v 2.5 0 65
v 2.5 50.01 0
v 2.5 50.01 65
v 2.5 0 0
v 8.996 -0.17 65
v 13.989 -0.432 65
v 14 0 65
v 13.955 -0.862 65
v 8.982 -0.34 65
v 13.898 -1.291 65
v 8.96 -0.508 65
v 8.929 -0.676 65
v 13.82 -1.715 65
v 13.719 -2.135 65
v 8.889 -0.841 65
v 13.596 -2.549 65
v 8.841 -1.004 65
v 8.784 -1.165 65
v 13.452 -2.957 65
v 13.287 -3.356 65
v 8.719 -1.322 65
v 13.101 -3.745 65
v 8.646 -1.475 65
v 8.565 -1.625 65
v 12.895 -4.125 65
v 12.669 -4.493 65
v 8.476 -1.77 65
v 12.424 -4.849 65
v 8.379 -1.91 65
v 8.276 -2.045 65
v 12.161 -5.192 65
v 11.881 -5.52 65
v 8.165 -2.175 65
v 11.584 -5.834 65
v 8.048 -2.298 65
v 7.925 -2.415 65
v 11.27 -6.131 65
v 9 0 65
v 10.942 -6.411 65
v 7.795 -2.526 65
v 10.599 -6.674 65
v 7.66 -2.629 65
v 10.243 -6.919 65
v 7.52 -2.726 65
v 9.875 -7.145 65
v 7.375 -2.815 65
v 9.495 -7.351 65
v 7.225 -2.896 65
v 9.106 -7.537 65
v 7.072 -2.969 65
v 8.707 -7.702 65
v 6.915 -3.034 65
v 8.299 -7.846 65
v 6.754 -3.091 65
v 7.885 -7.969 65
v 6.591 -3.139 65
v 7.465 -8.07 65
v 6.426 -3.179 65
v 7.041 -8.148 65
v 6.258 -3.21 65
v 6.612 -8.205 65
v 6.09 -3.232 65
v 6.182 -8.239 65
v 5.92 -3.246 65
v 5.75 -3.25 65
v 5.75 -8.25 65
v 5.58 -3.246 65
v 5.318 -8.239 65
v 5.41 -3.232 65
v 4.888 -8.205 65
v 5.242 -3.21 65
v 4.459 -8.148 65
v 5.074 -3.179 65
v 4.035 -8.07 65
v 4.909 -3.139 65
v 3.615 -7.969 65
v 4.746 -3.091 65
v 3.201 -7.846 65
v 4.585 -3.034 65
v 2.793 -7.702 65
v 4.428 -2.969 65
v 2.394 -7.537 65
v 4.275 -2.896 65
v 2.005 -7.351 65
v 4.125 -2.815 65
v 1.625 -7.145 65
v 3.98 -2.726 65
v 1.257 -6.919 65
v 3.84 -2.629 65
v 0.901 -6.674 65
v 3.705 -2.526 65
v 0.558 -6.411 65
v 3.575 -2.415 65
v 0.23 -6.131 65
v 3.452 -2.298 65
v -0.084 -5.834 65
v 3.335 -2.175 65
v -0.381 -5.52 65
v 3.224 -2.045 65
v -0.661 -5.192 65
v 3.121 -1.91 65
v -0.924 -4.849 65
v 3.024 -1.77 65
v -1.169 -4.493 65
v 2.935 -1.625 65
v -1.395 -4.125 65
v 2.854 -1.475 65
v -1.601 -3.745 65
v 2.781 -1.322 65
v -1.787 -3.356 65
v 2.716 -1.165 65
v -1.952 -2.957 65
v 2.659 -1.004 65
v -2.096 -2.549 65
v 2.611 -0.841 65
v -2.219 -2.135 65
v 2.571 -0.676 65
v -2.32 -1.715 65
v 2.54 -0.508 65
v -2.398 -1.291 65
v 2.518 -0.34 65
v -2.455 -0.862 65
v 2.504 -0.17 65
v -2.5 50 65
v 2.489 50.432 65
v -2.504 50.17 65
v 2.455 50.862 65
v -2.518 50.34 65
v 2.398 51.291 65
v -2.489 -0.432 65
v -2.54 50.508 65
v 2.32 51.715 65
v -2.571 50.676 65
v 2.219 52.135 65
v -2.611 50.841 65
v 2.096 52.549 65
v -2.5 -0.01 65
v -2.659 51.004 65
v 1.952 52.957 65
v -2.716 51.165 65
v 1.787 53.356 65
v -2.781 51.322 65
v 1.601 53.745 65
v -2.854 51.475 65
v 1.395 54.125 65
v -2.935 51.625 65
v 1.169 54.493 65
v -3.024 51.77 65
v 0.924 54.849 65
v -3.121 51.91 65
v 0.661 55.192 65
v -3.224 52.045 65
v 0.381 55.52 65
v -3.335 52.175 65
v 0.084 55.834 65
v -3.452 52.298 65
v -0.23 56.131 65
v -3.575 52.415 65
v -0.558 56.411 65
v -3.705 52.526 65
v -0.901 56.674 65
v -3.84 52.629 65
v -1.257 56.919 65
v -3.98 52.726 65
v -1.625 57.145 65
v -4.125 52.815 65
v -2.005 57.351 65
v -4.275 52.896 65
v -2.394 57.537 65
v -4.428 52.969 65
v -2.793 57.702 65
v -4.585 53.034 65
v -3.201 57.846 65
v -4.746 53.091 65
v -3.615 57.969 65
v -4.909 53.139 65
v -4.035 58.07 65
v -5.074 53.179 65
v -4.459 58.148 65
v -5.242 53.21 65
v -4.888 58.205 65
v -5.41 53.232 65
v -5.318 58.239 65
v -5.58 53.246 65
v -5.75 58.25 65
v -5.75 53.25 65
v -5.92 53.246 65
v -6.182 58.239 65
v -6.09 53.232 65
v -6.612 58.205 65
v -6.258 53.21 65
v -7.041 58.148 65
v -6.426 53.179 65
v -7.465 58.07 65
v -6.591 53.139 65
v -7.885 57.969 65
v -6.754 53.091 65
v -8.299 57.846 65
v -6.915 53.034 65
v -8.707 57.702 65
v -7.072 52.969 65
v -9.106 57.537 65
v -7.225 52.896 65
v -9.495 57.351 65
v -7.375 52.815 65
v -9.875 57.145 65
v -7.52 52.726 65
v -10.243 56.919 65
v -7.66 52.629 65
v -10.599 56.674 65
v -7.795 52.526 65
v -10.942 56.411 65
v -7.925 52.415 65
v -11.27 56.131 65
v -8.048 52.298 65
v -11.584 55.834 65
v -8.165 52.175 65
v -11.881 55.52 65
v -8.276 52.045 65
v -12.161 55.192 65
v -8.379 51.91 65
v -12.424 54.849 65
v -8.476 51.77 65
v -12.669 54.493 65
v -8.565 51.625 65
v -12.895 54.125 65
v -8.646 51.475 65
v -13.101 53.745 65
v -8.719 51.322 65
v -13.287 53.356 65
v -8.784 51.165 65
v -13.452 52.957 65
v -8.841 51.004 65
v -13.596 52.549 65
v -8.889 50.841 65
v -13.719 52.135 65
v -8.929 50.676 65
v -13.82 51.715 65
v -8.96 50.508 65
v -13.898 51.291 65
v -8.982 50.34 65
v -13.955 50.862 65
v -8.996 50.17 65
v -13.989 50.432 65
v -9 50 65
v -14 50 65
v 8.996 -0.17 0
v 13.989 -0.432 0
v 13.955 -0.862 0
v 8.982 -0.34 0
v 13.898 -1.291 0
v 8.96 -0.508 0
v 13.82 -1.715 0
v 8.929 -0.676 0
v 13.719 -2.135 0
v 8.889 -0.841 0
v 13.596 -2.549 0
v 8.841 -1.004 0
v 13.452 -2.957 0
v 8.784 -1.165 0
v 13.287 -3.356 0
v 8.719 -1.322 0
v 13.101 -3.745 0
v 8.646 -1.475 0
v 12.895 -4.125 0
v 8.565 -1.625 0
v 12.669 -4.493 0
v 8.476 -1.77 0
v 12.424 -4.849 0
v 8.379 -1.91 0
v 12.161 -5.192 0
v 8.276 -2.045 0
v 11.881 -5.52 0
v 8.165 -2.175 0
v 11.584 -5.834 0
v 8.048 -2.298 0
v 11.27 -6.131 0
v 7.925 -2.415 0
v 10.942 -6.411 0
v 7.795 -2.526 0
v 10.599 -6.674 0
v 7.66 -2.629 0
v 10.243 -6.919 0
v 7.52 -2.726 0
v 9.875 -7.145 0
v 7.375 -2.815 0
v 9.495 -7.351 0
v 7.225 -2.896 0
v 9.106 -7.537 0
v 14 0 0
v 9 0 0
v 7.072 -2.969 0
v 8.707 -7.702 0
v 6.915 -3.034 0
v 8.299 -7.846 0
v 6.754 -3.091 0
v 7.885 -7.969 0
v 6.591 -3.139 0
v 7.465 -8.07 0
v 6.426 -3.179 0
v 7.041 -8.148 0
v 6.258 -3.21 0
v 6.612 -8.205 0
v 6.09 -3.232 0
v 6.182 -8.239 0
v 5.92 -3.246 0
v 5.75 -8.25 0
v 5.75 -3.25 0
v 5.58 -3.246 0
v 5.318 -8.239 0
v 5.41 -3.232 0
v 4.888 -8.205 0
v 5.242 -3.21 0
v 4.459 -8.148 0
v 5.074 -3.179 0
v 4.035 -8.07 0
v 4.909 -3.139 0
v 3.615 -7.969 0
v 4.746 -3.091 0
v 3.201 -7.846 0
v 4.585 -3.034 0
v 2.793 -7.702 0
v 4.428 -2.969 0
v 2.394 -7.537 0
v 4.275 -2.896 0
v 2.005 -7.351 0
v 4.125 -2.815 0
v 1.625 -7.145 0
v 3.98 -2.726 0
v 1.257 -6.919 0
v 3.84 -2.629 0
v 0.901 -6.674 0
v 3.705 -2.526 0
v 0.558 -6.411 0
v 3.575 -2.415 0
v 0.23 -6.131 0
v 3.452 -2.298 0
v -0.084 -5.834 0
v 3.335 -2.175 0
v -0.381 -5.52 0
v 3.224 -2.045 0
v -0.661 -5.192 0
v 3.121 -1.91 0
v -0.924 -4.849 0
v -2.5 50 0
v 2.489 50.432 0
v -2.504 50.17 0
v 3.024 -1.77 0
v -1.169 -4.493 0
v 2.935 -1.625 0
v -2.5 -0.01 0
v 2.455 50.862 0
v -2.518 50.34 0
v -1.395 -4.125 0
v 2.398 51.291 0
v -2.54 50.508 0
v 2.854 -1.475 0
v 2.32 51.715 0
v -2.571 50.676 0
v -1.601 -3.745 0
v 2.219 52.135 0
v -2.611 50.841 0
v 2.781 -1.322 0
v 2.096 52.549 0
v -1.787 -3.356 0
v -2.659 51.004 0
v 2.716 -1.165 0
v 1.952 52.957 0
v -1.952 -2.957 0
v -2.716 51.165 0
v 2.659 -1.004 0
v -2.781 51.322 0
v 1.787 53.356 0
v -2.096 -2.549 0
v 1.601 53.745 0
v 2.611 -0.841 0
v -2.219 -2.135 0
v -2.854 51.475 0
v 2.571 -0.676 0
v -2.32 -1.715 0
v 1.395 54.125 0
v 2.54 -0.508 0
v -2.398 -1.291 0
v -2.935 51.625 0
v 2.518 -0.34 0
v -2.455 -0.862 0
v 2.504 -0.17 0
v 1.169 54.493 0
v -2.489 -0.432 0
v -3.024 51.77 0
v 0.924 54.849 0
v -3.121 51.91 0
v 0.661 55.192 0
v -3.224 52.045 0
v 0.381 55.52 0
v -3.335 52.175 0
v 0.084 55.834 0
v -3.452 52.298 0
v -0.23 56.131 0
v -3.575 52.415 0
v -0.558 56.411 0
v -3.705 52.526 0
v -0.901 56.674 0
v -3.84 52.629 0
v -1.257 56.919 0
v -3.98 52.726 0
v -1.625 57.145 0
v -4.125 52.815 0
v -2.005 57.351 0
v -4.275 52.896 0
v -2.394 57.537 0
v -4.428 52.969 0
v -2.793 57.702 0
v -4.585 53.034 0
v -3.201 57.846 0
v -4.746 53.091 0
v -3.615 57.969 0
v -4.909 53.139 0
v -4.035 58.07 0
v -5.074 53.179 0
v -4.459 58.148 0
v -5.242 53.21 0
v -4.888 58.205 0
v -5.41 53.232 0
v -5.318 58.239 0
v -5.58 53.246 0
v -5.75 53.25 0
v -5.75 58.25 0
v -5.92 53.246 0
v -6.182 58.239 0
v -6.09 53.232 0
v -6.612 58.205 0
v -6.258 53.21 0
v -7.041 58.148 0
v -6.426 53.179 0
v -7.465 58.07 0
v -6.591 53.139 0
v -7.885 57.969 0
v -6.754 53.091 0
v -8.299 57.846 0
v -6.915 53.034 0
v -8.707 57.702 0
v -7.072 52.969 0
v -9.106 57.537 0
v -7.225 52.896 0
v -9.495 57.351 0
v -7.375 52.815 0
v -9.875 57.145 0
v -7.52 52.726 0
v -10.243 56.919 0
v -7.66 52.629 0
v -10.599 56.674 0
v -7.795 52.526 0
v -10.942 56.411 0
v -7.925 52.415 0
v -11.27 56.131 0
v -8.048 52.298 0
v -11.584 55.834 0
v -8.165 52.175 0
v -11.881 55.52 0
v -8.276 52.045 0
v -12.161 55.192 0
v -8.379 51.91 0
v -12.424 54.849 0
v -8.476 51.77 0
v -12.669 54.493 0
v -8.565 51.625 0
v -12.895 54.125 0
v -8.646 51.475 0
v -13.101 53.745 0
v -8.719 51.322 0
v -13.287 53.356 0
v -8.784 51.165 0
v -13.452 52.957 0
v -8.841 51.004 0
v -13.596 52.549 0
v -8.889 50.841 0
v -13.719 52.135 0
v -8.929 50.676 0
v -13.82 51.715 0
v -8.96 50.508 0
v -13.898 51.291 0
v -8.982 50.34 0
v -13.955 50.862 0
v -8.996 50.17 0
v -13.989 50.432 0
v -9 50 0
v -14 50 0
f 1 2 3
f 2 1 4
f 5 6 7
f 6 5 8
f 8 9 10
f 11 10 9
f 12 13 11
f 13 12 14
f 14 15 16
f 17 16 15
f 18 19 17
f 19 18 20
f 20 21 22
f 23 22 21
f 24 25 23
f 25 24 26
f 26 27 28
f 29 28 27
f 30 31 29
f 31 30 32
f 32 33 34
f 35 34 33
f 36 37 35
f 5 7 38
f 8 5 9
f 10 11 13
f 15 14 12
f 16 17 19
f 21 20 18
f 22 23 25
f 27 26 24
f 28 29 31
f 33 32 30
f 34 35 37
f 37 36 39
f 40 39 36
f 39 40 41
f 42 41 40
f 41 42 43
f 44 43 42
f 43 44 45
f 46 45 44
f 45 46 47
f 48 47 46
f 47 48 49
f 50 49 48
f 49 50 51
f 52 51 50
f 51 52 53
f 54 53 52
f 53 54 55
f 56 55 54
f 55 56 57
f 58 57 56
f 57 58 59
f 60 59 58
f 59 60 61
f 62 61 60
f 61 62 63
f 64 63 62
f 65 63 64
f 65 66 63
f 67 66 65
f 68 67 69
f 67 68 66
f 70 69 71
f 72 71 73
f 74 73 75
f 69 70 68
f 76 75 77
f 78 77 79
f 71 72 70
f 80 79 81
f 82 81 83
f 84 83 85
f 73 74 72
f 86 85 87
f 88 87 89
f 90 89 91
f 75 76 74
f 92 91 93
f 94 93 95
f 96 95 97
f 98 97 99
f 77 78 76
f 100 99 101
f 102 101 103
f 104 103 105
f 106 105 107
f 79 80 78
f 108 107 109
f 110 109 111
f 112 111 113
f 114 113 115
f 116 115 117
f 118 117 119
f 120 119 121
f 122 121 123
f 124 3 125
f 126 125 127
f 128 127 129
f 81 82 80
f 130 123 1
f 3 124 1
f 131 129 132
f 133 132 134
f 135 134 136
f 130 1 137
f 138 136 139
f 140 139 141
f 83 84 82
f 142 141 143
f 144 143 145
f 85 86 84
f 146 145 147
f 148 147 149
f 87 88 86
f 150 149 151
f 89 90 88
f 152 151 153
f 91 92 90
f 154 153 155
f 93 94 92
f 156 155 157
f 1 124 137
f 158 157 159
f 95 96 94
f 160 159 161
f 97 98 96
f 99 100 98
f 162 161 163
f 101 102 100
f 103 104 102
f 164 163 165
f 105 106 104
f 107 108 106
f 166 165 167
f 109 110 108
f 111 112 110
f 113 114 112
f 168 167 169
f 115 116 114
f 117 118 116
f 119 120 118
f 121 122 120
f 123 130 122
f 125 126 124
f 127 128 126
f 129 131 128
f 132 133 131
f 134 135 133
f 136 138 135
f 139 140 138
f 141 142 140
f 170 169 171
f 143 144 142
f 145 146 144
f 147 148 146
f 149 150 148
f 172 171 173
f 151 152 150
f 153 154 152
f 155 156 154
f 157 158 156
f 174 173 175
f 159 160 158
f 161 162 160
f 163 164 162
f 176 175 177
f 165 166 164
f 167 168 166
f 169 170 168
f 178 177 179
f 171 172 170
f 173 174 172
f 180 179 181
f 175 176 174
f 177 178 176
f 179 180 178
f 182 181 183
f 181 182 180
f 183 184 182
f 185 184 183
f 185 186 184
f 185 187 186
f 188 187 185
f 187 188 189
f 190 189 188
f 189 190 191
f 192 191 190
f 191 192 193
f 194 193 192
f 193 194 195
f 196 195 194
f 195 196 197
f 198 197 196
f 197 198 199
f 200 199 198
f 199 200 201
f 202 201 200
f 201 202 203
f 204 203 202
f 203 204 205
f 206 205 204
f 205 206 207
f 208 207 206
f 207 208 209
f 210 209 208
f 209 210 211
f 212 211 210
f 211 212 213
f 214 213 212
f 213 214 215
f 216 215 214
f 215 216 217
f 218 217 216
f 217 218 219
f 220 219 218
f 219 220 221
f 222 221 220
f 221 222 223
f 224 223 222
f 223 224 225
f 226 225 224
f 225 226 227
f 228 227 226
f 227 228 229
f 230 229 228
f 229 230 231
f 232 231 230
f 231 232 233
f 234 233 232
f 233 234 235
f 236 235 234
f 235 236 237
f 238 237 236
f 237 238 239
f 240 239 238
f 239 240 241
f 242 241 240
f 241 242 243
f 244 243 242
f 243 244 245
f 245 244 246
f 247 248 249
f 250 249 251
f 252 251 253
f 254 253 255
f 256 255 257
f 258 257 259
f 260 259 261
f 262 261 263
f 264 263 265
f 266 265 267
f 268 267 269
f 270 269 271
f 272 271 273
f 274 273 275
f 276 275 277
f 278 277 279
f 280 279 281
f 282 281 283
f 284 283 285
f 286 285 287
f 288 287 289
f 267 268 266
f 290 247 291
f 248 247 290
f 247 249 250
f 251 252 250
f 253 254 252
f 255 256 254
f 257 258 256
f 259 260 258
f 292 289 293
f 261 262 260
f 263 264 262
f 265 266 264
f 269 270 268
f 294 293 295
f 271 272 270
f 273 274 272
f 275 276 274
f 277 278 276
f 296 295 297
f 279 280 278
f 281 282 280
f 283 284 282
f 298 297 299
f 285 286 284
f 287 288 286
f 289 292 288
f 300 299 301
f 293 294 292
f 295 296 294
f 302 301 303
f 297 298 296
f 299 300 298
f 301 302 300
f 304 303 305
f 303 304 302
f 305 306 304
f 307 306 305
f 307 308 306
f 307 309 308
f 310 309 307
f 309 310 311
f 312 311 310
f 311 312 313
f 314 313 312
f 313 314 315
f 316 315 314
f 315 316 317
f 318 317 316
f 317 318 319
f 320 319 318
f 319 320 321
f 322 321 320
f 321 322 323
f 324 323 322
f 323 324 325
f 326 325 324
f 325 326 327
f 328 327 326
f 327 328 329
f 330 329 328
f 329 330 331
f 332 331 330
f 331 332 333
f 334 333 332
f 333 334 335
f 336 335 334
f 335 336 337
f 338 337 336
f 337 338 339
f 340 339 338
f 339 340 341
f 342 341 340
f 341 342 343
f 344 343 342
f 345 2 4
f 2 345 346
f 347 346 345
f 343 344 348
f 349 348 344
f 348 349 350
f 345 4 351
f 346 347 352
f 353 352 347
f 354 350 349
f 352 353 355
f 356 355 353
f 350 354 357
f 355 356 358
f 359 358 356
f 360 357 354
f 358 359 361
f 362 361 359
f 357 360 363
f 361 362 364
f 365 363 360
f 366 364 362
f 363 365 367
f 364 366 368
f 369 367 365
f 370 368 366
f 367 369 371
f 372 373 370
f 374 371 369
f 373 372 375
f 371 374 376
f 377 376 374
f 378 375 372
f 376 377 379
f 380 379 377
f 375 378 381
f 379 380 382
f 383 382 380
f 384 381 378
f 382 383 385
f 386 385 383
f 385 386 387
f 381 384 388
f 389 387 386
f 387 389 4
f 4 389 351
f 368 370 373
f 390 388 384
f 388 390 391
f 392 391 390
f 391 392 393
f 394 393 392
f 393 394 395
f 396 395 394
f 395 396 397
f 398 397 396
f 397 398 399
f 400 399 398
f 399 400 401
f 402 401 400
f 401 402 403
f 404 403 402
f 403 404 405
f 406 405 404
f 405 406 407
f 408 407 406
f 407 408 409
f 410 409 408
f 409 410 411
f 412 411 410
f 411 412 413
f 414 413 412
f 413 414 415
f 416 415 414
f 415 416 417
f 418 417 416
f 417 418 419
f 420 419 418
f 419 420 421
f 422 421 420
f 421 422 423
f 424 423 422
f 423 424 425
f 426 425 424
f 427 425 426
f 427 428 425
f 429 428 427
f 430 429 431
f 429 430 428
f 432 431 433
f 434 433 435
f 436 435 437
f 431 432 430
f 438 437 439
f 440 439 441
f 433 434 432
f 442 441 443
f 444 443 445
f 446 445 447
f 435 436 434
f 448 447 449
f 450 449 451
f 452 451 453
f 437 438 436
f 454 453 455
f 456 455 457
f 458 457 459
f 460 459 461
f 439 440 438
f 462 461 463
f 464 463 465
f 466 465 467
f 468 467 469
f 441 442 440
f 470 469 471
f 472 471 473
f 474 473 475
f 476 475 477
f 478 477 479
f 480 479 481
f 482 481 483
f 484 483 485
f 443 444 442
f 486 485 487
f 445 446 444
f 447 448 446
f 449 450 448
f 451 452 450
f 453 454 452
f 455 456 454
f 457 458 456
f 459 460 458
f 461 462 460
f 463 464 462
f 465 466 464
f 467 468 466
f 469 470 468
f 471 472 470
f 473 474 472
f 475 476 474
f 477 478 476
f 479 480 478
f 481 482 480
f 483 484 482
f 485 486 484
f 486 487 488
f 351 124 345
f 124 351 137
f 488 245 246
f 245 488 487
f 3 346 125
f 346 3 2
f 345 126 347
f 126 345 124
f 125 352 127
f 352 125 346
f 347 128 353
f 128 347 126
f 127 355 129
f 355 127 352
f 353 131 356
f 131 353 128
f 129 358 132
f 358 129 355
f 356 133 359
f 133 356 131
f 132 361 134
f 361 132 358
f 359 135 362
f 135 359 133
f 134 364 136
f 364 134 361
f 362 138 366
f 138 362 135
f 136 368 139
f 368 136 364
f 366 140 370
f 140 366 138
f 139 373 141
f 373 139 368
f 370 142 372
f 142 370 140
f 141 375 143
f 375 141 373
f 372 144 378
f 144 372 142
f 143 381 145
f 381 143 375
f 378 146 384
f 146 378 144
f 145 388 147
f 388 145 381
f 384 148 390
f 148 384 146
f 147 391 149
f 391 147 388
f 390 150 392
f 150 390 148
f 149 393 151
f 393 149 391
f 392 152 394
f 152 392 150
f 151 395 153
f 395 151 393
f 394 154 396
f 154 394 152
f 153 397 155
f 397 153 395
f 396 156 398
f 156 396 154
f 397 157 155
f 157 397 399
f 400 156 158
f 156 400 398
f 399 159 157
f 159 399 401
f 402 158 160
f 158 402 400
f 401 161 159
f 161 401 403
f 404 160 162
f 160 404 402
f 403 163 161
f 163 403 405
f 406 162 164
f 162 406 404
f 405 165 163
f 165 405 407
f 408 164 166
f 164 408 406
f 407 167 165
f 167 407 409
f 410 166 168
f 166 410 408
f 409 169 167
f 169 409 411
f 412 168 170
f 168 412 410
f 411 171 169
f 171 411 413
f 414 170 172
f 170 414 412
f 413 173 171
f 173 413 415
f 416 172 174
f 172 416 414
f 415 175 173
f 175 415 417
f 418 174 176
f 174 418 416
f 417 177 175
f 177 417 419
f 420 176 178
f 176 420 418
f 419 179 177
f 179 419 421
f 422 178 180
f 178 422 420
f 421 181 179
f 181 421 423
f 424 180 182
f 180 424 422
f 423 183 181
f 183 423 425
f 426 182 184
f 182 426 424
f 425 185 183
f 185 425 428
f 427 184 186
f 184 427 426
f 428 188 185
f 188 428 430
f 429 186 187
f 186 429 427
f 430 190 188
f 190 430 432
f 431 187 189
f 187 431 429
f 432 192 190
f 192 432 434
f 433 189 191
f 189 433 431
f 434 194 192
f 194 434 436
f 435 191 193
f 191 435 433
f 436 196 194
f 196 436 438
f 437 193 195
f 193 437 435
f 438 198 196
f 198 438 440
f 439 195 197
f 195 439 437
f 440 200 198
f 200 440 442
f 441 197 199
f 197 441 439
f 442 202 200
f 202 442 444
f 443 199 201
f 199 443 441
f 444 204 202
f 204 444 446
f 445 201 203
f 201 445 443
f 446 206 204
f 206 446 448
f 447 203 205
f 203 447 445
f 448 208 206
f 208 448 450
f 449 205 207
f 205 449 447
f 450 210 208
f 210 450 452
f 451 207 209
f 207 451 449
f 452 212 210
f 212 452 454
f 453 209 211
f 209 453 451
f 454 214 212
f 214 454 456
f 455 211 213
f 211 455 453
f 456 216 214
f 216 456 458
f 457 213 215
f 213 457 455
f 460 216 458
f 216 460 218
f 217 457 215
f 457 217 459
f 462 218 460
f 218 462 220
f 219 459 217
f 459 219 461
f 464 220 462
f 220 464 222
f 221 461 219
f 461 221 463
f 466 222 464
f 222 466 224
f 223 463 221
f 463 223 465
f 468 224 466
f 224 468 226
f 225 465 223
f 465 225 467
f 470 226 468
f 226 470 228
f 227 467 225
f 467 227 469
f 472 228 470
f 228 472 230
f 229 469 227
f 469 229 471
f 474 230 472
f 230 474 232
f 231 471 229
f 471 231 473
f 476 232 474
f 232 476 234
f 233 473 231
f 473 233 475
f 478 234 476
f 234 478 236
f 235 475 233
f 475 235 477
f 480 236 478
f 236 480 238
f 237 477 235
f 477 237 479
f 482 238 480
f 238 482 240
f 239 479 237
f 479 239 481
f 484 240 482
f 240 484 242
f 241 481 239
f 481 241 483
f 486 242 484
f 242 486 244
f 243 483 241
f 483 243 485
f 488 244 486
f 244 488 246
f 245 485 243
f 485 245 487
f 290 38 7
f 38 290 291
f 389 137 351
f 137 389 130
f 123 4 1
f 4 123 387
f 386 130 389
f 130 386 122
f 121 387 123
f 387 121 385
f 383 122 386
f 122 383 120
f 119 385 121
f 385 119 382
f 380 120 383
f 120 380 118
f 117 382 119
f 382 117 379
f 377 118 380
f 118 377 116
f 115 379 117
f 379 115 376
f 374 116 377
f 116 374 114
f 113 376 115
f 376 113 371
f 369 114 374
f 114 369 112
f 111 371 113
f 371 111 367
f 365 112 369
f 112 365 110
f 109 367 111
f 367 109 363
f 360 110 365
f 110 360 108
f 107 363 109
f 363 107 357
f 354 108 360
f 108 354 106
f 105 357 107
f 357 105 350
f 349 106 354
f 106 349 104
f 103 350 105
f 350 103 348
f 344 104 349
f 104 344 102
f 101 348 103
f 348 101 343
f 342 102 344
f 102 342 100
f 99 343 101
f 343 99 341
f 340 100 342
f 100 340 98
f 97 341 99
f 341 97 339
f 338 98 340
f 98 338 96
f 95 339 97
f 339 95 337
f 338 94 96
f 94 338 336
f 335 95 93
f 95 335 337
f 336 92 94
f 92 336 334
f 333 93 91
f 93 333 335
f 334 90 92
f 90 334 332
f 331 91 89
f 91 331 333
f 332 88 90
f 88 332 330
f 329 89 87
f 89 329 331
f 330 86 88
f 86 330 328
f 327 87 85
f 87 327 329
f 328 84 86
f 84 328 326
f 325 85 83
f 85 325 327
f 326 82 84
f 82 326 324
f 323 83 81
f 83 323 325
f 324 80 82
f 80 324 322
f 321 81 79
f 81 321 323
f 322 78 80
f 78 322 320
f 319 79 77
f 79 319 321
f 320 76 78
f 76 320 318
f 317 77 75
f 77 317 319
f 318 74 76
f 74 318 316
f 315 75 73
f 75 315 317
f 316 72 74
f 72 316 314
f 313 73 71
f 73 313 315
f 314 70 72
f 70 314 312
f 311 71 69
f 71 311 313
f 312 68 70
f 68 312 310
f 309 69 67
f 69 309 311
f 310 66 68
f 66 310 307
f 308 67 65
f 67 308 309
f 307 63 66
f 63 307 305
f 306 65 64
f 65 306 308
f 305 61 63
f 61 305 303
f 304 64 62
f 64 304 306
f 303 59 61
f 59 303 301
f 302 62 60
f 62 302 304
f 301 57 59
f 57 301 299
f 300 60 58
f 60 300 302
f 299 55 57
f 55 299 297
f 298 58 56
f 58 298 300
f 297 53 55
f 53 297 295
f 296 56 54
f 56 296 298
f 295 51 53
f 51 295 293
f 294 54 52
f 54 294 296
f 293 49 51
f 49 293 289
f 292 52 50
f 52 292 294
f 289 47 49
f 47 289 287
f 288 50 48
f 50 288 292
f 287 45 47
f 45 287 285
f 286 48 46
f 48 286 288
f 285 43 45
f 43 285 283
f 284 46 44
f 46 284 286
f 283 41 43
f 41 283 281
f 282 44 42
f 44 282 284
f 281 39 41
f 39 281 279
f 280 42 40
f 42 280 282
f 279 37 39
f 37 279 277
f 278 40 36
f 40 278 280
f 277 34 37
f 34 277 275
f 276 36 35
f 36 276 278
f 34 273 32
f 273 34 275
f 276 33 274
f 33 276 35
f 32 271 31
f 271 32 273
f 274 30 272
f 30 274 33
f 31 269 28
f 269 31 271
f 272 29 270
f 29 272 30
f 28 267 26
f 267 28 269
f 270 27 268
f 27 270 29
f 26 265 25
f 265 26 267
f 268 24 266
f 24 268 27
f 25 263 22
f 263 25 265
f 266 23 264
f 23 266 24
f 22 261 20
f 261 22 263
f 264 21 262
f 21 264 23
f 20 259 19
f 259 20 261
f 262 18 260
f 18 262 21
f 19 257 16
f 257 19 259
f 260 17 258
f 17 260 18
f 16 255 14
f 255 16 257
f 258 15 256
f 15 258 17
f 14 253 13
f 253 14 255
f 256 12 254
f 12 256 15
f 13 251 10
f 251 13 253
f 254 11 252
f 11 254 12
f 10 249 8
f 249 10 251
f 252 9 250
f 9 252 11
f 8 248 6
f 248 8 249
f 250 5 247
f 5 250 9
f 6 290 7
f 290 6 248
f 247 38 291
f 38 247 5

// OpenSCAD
// ============================================================
//  Long S-hook  (parametric, square stock)
//  Units: millimeters
// ============================================================
// ---- Parameters ----
spine_len  = 50;    // length of the straight middle section
overall_w  = 28;    // total side-to-side width of the finished S
thickness  = 5;     // in-plane bar width (the radial cross-section)
z_depth    = 65;    // extrusion depth in Z
hook_sweep = 180;   // degrees each end curls; 180 = open C, >180 = closes in
$fn        = 120;   // arc smoothness
// ---- Derived ----
th = thickness;
r  = (overall_w - th) / 4;   // centerline radius of each hook
                             // width = 4*r + th  ->  r = (width - th)/4
// inner radius must stay positive or rotate_extrude fails
assert(r - th/2 > 0, "overall_w too small (or thickness too big) for this radius");
// One hook: an arc whose connection point sits at the origin
// and which curls up and to the -X side. Cross-section is th (radial) x z_depth (Z).
module hook() {
    translate([-r, 0, 0])
        rotate_extrude(angle = hook_sweep)
            translate([r - th/2, 0, 0])
                square([th, z_depth]);   // radial width x Z depth
}
module s_hook() {
    union() {
        // straight spine, centered on x = 0, running along Y
        translate([-th/2, -0.01, 0])
            cube([th, spine_len + 0.02, z_depth]);
        // top hook  (opens down-left)
        translate([0, spine_len, 0]) hook();
        // bottom hook (top hook turned 180deg -> opens up-right => S shape)
        rotate([0, 0, 180]) hook();
    }
}
s_hook();
